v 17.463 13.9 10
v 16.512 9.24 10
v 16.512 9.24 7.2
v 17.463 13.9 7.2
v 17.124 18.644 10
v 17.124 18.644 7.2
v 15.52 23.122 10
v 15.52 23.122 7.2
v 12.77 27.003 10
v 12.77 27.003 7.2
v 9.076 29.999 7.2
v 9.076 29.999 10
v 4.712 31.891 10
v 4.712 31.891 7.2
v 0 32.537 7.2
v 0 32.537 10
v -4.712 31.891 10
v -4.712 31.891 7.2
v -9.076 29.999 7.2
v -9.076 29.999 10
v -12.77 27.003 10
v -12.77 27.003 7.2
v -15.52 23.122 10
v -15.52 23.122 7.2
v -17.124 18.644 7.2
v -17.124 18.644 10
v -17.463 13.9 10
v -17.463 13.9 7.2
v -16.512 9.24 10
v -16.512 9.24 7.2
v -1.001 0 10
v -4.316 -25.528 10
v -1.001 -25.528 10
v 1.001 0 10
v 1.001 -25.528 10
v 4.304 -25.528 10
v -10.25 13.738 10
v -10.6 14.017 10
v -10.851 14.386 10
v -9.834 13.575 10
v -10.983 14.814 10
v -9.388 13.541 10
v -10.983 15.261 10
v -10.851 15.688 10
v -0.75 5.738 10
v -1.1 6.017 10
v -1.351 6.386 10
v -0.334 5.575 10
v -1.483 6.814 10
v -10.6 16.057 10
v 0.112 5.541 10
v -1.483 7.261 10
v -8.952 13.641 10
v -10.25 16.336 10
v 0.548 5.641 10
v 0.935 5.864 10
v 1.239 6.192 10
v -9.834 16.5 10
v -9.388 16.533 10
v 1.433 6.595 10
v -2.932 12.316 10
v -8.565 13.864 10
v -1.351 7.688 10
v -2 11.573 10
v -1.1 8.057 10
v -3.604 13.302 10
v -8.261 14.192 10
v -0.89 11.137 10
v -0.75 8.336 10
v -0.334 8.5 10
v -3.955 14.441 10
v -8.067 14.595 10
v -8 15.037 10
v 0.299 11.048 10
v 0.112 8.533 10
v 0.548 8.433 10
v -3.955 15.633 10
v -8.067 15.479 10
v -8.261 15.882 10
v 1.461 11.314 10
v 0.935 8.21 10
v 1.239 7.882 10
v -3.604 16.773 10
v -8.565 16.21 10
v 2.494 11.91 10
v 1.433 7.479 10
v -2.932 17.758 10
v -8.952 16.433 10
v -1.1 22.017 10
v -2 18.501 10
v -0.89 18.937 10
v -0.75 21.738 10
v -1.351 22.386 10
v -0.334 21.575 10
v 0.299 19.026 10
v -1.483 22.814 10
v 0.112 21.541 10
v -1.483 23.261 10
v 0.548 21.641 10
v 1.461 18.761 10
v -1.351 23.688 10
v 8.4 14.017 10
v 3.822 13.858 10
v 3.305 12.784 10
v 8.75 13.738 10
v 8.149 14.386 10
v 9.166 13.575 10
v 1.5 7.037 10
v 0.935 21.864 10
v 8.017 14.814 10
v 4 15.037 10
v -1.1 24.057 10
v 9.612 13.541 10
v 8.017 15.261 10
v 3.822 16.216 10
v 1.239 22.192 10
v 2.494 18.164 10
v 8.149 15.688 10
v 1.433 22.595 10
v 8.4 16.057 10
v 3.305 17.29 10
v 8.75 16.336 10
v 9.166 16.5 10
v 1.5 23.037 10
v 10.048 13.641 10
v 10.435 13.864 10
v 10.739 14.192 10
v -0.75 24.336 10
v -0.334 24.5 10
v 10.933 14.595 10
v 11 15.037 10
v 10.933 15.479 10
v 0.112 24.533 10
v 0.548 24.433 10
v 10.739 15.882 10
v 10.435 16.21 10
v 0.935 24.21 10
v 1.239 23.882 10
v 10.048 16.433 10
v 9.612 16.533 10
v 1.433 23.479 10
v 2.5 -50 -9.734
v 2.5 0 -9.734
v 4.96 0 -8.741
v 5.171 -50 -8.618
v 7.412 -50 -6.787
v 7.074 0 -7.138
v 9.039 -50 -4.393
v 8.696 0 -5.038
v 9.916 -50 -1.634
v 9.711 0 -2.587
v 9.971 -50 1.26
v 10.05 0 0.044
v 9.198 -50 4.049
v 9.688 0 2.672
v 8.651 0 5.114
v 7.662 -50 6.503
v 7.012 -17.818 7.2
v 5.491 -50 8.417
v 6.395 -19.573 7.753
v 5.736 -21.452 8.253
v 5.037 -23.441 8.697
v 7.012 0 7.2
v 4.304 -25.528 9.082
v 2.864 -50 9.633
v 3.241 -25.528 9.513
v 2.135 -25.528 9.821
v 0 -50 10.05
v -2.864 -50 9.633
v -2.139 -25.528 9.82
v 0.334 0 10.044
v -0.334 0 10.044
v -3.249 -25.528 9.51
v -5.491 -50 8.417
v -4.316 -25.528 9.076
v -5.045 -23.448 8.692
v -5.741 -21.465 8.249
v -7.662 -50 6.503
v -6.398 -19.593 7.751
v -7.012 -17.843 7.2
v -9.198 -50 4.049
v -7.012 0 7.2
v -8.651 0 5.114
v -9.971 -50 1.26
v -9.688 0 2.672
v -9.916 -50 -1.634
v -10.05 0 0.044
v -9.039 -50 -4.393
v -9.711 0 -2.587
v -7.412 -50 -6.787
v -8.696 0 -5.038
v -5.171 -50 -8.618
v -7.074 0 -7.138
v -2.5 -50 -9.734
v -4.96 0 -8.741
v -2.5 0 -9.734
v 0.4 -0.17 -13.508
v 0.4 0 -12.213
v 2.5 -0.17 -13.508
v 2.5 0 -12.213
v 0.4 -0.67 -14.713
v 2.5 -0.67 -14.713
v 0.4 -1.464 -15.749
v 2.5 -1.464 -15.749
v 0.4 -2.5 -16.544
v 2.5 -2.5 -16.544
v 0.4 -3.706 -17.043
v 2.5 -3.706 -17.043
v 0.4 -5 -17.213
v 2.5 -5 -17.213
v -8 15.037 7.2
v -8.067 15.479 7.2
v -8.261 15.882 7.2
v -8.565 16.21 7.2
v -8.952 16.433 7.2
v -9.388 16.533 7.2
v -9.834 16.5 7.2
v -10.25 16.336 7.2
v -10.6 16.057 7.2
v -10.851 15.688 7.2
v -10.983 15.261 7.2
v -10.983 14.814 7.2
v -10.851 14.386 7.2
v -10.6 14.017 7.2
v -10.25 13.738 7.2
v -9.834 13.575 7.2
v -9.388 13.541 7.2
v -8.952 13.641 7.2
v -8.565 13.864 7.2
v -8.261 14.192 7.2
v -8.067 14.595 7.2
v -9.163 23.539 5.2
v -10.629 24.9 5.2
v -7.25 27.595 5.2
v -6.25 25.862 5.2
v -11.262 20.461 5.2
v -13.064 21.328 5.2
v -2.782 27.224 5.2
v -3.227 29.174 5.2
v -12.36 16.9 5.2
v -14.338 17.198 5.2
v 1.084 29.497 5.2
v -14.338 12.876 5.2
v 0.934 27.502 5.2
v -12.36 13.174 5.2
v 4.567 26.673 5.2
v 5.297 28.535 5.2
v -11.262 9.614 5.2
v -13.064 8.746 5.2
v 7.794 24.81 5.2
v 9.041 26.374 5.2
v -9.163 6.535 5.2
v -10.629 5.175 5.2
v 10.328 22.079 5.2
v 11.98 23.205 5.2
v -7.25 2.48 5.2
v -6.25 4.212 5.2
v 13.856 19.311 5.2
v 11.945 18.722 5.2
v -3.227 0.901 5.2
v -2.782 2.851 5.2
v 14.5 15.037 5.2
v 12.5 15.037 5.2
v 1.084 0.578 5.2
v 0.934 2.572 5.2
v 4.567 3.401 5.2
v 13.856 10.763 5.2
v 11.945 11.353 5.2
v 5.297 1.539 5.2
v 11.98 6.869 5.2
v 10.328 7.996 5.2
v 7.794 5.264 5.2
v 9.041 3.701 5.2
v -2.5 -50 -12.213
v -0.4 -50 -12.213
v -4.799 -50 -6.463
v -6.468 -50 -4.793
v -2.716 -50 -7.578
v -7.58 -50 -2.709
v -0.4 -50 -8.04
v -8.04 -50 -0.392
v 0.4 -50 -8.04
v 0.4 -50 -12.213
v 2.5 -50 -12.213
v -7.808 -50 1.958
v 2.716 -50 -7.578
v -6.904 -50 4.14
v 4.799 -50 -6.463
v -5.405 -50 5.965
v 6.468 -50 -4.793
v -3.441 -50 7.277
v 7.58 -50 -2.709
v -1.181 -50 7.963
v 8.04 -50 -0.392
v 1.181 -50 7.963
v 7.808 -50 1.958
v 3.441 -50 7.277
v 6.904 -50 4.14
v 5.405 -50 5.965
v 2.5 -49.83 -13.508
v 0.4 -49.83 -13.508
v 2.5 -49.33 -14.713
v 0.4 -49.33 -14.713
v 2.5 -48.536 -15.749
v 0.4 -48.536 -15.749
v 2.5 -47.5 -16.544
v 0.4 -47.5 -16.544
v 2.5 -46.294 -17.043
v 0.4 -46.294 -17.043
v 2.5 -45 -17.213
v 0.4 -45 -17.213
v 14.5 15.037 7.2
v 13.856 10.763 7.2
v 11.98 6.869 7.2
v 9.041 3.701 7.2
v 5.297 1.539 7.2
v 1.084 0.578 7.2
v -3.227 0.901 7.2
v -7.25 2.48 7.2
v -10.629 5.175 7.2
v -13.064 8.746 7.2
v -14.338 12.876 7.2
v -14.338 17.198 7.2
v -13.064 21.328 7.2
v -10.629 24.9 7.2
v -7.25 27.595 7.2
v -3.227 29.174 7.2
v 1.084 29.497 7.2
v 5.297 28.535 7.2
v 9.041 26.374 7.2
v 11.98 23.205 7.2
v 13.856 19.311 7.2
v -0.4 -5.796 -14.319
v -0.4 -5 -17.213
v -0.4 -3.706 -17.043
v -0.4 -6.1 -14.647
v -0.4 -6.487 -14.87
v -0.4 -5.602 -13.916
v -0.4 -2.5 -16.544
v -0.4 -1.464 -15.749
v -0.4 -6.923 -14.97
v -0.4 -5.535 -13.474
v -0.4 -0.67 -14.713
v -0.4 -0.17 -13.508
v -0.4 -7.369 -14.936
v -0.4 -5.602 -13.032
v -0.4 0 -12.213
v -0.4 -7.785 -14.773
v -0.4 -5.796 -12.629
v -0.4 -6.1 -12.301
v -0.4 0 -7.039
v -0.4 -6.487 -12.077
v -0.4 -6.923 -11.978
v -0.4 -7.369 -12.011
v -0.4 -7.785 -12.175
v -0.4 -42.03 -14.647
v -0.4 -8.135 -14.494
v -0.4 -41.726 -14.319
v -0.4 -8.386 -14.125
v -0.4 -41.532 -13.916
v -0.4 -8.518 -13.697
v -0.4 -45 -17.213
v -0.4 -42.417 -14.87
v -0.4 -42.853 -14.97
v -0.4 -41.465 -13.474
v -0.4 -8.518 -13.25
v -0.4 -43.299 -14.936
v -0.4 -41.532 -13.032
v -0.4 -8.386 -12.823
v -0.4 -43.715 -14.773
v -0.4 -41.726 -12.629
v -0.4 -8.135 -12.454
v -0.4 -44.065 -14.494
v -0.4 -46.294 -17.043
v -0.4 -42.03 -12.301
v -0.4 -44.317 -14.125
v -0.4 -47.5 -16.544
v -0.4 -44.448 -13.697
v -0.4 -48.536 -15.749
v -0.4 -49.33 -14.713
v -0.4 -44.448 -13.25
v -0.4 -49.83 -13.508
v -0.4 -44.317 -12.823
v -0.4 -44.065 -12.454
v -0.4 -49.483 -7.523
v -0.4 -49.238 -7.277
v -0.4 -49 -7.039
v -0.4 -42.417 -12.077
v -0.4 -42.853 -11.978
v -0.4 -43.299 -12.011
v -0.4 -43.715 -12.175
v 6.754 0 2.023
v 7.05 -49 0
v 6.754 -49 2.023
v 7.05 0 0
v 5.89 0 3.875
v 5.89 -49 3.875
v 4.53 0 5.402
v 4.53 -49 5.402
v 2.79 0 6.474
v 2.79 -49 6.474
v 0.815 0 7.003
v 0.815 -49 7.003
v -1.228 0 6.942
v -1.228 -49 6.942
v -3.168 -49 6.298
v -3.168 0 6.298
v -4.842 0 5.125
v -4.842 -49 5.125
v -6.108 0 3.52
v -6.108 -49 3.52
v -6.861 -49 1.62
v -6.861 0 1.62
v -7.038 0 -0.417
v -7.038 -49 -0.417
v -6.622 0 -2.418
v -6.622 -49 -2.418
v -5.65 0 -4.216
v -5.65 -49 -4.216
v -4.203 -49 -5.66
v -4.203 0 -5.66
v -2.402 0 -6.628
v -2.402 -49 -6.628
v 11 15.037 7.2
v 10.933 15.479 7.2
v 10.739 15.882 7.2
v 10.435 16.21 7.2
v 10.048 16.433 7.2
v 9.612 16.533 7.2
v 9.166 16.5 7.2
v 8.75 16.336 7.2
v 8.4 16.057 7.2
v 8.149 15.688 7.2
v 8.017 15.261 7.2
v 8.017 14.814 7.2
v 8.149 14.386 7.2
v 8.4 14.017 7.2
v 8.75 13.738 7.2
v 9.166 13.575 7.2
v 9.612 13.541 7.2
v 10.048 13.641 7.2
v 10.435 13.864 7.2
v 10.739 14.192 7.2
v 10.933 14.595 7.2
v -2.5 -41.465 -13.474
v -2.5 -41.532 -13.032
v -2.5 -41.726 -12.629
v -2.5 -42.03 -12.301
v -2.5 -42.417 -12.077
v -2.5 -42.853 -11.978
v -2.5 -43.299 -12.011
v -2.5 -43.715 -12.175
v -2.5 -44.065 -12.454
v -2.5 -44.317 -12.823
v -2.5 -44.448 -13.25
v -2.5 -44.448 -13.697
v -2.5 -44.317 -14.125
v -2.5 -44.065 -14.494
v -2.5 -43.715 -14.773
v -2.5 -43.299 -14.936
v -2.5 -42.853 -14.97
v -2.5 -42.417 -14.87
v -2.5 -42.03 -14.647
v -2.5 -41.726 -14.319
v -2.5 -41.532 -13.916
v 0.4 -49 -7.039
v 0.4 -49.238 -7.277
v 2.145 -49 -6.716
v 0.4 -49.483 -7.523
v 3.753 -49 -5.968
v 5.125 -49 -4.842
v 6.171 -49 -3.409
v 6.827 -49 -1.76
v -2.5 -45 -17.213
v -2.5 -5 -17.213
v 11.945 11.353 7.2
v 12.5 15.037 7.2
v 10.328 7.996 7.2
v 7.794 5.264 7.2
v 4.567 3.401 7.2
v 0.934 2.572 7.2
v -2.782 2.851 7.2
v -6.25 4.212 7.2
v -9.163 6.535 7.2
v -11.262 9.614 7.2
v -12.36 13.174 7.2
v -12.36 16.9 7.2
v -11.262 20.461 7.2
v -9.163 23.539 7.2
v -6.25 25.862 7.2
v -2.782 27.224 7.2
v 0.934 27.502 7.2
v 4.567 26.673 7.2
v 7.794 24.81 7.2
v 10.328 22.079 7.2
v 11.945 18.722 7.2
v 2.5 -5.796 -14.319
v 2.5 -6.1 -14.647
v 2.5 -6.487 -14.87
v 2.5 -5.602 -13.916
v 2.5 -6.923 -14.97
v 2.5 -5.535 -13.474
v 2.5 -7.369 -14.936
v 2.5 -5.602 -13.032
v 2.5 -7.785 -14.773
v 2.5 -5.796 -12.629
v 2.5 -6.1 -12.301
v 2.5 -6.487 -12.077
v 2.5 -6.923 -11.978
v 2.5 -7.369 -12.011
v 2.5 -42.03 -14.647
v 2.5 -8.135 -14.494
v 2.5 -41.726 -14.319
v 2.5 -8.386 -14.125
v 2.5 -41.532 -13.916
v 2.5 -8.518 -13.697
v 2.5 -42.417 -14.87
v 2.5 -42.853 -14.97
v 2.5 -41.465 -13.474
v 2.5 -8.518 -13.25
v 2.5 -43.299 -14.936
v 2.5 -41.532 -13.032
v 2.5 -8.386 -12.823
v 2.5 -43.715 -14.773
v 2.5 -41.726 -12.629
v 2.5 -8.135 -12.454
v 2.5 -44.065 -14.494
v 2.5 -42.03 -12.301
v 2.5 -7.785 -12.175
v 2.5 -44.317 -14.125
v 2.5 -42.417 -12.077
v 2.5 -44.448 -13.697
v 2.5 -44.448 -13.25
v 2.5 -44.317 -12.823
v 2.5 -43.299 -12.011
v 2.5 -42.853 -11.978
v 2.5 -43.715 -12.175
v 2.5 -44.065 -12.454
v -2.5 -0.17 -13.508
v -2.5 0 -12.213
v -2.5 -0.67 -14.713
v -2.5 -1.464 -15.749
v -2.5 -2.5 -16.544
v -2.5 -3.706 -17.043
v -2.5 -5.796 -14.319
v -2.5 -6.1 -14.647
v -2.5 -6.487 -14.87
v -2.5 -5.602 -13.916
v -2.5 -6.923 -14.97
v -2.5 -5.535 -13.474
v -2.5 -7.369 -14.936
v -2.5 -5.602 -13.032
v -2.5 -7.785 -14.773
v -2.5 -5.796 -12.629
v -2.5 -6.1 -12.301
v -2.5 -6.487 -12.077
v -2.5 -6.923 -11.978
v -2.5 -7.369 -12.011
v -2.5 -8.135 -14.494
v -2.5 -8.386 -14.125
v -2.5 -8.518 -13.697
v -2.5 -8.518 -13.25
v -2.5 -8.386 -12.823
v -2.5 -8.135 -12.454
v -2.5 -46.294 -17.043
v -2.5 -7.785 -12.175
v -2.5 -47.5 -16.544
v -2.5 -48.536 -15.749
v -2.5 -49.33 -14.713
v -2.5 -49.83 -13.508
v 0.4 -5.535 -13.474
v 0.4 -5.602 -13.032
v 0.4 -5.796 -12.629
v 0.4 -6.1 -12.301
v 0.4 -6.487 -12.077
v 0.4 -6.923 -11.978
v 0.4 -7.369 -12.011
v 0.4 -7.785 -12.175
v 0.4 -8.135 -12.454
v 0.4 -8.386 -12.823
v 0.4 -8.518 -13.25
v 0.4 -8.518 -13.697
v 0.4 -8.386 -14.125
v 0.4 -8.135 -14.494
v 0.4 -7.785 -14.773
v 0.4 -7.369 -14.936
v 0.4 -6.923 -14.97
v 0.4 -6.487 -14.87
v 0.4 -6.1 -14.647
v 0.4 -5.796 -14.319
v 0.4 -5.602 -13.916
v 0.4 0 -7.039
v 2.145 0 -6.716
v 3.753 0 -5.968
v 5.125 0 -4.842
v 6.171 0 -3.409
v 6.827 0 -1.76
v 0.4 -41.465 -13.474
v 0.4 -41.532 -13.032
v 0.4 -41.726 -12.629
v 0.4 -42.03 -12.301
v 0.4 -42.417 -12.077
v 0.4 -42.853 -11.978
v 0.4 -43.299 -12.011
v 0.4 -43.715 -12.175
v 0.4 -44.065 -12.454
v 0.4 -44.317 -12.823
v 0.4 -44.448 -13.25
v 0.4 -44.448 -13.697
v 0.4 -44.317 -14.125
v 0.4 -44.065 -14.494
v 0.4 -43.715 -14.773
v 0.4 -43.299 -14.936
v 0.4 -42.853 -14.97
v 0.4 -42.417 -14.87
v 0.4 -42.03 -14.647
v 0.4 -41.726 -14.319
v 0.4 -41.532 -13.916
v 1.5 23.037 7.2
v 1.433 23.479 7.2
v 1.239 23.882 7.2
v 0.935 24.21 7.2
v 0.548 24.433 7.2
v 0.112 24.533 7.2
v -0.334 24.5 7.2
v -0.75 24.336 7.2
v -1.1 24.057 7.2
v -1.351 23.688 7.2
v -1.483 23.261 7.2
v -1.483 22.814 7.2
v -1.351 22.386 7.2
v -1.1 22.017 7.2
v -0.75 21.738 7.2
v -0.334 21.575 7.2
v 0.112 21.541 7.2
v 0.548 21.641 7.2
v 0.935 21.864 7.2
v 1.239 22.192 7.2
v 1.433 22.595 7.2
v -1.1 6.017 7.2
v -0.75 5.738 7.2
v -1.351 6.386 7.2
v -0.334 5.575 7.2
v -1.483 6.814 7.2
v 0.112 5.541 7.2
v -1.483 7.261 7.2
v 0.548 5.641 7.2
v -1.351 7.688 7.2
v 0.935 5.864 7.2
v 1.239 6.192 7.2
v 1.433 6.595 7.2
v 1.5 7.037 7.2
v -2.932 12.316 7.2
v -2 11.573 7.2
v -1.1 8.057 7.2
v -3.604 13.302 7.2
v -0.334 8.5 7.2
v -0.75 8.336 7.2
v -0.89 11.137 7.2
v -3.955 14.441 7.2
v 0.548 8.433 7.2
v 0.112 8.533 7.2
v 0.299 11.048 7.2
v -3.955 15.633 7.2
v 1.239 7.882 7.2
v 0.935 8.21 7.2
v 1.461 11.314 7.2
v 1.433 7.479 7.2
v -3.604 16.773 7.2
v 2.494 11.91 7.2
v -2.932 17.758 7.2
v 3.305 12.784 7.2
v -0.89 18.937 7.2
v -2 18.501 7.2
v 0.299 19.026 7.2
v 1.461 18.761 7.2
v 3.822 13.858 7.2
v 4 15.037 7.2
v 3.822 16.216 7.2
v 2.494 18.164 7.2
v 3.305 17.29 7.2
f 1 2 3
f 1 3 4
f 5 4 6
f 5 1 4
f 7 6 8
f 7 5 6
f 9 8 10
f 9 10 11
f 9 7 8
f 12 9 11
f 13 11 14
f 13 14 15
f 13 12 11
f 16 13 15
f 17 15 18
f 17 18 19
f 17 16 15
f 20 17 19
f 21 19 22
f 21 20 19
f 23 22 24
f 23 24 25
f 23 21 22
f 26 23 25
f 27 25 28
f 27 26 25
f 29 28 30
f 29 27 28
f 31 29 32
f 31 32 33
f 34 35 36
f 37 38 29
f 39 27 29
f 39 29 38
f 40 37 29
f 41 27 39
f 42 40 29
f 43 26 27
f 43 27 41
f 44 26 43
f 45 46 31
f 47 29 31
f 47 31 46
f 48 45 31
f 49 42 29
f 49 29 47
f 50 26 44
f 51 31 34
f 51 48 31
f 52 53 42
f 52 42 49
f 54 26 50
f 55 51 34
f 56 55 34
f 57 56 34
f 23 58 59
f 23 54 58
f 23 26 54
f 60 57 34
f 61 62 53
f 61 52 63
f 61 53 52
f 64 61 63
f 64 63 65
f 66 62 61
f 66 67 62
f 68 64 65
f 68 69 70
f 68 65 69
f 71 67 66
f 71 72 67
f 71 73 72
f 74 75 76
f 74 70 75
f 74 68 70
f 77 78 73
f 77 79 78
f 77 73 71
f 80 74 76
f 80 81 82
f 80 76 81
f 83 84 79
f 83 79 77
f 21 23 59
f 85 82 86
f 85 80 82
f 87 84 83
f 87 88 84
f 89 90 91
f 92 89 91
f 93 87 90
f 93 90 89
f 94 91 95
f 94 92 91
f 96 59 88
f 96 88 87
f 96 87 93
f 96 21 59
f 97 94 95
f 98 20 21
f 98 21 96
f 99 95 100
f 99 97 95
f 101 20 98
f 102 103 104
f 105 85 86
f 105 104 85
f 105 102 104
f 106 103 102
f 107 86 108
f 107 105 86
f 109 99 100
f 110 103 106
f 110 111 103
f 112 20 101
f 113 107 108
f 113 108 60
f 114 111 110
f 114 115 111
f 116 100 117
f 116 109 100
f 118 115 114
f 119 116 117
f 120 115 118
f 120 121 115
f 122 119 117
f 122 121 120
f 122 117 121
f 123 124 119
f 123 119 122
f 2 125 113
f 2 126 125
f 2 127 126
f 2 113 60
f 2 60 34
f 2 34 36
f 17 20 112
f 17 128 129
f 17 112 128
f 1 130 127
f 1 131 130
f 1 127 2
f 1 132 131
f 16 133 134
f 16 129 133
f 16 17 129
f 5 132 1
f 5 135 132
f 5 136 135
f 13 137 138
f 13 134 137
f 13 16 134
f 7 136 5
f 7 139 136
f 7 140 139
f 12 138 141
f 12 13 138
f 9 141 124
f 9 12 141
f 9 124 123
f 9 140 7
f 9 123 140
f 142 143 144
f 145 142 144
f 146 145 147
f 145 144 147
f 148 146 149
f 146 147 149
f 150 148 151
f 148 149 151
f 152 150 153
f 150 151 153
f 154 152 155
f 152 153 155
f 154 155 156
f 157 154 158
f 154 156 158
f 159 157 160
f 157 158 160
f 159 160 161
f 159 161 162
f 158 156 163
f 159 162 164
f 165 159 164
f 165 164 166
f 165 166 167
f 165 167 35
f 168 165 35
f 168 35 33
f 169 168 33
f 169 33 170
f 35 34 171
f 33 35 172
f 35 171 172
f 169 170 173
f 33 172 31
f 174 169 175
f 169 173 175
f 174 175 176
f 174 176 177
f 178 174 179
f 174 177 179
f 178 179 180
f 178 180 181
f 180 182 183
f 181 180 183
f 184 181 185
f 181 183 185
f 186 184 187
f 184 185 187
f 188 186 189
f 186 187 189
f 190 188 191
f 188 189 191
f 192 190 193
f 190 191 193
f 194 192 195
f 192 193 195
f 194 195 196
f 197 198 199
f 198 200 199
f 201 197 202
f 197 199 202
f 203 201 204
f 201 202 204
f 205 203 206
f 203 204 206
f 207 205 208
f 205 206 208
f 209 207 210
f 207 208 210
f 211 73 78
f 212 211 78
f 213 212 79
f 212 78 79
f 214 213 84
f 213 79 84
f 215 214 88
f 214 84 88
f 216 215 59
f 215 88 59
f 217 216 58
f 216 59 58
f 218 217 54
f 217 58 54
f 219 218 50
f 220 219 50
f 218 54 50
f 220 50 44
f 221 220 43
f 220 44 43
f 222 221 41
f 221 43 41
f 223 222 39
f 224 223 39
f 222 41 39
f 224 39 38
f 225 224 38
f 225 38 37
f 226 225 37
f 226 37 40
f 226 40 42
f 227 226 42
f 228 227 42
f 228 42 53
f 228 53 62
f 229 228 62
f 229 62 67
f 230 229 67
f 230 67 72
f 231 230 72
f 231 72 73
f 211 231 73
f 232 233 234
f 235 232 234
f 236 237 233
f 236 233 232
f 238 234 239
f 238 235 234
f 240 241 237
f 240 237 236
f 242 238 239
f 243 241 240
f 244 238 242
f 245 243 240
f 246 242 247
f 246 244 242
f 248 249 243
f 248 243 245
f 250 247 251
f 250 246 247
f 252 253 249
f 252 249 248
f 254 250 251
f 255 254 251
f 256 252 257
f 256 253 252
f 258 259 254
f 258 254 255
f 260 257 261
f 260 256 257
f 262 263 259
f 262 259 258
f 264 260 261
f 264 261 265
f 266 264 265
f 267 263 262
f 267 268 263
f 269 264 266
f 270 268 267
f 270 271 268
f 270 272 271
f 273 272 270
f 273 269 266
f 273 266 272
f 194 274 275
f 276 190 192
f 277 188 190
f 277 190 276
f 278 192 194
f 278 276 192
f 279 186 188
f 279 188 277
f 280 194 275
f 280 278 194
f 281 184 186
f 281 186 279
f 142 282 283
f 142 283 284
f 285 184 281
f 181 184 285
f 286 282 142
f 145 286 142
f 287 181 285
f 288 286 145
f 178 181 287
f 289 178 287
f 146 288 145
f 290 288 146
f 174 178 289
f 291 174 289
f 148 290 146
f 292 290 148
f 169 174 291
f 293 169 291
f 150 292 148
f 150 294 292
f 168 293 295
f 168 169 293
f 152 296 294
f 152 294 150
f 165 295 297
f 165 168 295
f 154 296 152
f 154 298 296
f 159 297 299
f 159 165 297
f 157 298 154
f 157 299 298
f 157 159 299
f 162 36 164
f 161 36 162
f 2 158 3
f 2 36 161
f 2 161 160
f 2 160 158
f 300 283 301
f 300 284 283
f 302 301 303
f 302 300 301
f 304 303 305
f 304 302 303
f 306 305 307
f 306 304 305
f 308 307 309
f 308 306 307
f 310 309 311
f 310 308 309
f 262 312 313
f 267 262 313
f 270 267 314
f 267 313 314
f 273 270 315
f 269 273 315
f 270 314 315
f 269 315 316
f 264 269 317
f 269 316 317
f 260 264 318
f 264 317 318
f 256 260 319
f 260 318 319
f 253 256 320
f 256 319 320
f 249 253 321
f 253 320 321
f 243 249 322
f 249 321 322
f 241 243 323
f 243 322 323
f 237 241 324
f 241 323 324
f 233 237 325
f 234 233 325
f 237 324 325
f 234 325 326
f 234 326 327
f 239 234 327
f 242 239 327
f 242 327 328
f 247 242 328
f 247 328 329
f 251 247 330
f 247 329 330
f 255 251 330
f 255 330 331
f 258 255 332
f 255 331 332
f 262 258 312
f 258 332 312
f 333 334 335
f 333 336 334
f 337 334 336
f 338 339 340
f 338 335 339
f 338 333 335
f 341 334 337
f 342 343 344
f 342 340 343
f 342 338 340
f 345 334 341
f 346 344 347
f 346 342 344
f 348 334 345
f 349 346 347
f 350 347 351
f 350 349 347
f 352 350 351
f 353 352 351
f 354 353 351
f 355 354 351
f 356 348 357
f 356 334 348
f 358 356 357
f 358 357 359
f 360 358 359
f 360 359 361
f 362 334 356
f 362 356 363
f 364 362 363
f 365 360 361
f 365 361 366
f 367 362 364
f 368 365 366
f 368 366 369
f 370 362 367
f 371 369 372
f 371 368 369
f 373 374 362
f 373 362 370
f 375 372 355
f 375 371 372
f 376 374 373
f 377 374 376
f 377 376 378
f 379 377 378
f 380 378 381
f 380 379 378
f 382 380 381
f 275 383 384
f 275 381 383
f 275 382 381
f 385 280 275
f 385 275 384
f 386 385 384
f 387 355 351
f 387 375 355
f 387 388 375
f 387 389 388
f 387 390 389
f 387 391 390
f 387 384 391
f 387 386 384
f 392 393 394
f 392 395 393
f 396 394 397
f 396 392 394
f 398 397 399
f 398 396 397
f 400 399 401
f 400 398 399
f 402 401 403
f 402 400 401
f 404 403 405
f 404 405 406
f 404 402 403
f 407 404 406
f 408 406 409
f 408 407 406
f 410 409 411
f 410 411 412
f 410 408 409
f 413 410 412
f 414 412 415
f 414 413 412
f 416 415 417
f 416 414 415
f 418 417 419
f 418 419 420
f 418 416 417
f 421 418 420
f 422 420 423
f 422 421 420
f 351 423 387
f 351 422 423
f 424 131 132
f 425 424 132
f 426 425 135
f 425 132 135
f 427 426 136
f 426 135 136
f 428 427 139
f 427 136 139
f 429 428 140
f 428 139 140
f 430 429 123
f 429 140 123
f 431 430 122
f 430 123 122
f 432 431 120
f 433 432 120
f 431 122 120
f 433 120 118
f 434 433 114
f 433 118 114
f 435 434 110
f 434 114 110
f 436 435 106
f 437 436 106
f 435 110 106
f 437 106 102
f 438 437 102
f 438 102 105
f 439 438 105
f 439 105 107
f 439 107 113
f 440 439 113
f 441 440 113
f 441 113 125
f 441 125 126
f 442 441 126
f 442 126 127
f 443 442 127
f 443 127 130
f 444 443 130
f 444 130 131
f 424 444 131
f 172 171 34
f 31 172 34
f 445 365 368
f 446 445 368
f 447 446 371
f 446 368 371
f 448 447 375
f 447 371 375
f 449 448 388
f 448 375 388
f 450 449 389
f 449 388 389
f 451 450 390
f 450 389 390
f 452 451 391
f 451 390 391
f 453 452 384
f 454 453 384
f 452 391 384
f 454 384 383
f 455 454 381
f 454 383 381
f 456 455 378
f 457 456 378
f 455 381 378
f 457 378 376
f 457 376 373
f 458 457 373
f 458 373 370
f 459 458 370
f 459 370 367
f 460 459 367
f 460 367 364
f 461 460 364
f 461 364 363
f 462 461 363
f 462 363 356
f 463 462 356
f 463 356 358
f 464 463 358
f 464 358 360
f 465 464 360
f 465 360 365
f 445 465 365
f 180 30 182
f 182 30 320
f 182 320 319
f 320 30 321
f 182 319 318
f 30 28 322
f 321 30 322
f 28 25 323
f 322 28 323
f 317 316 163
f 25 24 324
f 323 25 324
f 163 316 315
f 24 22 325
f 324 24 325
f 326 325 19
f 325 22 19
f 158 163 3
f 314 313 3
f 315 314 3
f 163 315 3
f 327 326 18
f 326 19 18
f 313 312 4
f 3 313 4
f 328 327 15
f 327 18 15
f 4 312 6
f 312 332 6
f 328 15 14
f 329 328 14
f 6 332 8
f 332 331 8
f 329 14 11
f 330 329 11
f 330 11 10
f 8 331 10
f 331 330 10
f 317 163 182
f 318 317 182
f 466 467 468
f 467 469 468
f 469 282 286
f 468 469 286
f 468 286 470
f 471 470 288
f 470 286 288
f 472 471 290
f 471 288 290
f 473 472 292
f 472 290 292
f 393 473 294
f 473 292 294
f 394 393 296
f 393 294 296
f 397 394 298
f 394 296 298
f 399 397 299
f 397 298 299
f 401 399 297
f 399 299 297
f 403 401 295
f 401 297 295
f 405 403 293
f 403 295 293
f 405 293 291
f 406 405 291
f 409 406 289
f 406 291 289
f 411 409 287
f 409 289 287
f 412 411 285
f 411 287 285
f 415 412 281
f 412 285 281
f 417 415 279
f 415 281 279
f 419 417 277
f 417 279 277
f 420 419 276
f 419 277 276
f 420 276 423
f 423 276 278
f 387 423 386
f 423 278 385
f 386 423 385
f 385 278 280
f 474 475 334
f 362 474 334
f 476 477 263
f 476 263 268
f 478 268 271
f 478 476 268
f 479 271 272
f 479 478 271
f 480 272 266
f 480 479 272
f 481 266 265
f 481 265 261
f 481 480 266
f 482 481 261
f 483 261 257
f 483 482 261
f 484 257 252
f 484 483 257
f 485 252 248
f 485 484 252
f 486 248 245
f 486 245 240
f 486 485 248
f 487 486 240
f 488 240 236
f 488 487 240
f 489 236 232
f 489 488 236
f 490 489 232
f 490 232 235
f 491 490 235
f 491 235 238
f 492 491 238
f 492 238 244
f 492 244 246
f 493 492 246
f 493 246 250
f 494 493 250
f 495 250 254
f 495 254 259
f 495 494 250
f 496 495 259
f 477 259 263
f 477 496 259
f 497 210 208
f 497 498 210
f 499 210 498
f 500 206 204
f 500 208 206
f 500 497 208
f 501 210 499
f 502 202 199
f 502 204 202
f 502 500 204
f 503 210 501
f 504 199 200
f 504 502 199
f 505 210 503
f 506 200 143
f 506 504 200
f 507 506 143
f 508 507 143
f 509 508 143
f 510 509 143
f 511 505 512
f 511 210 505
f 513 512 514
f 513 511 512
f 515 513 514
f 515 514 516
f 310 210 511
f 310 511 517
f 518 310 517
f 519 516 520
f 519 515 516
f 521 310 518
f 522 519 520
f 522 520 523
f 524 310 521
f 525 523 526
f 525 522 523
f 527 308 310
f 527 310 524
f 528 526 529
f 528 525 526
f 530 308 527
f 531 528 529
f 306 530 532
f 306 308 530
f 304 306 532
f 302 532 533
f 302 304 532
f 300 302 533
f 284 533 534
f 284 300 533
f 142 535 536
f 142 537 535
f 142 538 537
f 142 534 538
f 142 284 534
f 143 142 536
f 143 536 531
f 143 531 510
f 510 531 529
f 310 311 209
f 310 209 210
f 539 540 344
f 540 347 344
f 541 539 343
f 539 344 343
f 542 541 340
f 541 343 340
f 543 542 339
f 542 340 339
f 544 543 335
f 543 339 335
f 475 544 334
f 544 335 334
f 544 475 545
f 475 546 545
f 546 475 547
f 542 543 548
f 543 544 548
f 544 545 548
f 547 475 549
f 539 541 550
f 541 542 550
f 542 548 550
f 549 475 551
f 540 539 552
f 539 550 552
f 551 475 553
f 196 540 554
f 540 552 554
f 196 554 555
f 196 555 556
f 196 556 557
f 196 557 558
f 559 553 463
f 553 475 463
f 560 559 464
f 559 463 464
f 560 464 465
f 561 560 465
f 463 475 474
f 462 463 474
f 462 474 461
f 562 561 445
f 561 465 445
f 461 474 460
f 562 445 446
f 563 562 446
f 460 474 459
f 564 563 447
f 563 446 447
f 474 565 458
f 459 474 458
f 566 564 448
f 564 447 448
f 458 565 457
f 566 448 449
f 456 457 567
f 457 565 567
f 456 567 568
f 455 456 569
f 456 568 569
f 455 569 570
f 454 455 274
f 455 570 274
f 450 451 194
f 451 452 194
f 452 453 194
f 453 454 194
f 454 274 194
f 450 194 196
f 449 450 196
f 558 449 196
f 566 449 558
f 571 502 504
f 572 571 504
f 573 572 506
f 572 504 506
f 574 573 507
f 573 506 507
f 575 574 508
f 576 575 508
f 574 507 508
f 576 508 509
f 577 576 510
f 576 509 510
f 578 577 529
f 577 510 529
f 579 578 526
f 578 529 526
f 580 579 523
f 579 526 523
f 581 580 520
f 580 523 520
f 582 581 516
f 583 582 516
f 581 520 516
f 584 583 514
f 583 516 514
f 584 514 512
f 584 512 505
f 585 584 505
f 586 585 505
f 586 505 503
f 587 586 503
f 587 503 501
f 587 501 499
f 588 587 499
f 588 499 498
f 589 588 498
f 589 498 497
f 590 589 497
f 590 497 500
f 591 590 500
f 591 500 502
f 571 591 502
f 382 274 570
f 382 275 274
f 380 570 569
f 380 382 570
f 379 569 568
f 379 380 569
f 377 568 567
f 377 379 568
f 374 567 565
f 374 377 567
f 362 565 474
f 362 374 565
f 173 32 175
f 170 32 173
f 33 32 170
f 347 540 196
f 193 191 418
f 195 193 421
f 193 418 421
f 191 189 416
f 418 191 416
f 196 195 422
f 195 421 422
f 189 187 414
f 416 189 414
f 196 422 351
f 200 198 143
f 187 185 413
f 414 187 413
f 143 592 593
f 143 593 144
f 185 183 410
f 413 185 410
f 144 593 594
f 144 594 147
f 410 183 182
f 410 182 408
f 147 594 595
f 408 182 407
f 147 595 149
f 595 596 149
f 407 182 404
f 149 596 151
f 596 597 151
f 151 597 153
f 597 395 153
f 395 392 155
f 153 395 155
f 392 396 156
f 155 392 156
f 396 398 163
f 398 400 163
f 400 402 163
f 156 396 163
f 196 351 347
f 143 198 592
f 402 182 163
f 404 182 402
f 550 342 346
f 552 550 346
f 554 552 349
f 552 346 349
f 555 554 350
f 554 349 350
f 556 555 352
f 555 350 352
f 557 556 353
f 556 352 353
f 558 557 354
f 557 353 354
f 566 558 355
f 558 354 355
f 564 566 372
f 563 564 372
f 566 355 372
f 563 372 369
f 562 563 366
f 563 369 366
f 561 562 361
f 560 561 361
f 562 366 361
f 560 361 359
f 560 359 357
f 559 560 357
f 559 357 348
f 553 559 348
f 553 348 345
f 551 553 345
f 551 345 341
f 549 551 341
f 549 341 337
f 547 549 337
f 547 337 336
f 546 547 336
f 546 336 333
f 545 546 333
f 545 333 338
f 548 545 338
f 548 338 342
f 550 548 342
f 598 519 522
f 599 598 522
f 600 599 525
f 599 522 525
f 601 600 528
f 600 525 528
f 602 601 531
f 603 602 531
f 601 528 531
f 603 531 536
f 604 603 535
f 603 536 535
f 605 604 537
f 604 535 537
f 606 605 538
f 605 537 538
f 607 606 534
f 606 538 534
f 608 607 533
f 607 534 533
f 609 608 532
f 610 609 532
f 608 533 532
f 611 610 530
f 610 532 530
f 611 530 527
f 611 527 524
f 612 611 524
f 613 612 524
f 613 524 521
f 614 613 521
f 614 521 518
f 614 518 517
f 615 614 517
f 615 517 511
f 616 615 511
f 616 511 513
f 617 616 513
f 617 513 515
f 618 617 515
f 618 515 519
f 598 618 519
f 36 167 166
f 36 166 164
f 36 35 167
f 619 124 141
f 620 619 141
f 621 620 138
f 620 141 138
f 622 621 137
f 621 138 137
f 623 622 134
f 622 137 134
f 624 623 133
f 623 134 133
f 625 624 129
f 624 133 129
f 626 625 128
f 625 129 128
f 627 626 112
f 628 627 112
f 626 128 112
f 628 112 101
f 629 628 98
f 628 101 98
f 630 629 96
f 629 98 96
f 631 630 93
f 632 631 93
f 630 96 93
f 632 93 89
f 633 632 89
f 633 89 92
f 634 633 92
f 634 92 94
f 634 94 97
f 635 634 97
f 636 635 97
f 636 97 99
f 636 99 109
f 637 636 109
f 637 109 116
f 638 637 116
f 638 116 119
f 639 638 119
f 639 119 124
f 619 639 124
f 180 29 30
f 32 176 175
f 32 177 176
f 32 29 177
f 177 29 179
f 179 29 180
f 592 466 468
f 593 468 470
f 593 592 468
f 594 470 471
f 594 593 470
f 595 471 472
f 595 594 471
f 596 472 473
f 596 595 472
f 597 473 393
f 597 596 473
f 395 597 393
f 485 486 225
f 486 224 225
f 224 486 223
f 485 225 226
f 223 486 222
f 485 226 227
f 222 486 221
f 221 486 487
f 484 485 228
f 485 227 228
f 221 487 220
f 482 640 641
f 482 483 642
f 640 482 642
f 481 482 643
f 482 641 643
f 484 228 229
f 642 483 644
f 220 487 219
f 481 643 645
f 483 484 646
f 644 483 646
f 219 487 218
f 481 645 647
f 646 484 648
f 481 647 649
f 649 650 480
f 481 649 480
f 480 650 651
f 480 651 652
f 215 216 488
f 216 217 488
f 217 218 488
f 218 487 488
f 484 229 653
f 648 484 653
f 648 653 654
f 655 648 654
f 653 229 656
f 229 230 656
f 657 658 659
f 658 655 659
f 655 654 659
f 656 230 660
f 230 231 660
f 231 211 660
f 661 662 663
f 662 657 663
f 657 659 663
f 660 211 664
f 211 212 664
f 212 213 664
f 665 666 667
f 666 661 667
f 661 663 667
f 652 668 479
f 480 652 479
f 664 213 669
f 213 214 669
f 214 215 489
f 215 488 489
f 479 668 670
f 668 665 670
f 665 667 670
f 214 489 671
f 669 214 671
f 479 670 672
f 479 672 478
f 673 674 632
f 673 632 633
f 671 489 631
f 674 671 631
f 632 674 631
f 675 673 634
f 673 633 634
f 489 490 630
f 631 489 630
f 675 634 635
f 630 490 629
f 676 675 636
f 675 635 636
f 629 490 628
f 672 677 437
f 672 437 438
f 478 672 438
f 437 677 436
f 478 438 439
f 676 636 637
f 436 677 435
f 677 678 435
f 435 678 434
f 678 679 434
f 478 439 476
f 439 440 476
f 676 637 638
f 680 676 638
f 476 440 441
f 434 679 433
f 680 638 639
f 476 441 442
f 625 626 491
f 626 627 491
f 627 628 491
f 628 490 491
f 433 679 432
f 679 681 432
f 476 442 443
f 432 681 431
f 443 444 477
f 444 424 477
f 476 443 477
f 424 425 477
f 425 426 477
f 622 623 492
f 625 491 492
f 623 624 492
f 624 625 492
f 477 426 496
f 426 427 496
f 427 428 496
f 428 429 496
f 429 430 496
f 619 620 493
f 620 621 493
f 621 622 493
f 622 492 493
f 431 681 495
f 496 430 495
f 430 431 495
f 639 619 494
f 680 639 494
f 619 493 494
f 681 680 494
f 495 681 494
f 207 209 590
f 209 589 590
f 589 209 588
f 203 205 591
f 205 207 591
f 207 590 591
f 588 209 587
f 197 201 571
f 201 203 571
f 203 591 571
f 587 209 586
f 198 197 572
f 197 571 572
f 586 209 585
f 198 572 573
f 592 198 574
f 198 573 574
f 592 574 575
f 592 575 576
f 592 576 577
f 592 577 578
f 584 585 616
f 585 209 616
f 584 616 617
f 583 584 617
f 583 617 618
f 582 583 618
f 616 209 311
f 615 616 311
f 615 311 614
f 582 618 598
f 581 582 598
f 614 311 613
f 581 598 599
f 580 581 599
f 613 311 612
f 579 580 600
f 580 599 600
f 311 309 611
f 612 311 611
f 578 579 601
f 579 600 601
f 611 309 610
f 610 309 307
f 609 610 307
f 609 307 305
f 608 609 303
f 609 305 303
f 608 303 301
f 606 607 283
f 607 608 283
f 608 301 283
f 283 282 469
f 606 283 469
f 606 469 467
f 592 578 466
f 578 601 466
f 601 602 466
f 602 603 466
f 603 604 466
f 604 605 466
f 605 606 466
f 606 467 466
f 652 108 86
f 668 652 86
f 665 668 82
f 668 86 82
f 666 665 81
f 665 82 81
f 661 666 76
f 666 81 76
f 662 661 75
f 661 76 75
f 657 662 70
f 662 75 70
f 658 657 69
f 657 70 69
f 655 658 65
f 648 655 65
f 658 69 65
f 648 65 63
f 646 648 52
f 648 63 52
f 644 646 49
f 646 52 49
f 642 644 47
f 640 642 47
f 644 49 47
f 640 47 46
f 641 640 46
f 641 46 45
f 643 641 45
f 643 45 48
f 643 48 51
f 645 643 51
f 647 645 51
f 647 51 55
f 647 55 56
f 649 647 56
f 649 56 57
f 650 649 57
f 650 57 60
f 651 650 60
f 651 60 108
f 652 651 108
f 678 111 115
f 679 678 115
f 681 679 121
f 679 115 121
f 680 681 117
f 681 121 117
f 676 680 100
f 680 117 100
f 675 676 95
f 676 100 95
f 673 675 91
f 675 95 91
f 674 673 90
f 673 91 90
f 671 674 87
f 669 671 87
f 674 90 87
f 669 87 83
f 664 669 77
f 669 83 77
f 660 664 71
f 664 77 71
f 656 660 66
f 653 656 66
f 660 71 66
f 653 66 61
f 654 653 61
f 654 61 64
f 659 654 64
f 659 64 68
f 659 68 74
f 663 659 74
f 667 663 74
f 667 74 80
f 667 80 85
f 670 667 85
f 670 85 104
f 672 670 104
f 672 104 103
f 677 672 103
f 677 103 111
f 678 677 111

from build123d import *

# Parameters (mm, degrees)
F0_R      = 10.05
F0_R_2    = 7.05
F1_DEPTH  = 50
F3_R      = 17.5
F4_DEPTH  = 2.8
F5_W      = 5
F5_H      = 10
F6_DEPTH  = 50
F7_W      = 0.8
F7_H      = 12.637284
F8_DEPTH  = 82.538162
F10_DEPTH = 2.8
F11_R     = 1.5
F11_R_2   = 4
F12_DEPTH = 25
F13_R     = 14.5
F13_R_2   = 12.5
F14_DEPTH = 2
F15_R     = 1.5
F16_DEPTH = 20.001
F17_R     = 5
F18_SIZE  = 1


with BuildPart() as f1:
    # F0 (on Front) → F1 (new body)
    with BuildSketch(Plane.XZ):
        Circle(F0_R)
        Circle(F0_R_2, mode=Mode.SUBTRACT)
    extrude(amount=F1_DEPTH)

    # F3 (on offset) → F4 (join)
    with BuildSketch(Plane.XY.offset(10)):
        with Locations((0, 15.037162)):
            Circle(F3_R)
    extrude(amount=-F4_DEPTH)

    # F5 (on face) → F6 (join, through all)
    with BuildSketch(Plane.XZ.offset(50)):
        with Locations((0, -12.213485)):
            Rectangle(F5_W, F5_H)
    extrude(amount=-F6_DEPTH)

    # F7 (on face) → F8 (cut, through all)
    with BuildSketch(Plane.XZ.offset(50)):
        with Locations((0, -12.604385)):
            Rectangle(F7_W, F7_H)
    extrude(amount=-F8_DEPTH, mode=Mode.SUBTRACT)

    # F9 (on face) → F10 (join)
    with BuildSketch(Plane.XY.offset(10)):
        Polygon((4.304297, -25.528217), (16.511778, 9.239647), (-16.511778, 9.239647), (-4.315564, -25.528217), align=None)
    extrude(amount=-F10_DEPTH)

    # F11 (on face) → F12 (cut)
    with BuildSketch(Plane.XY.offset(10)):
        with Locations((0, 23.037162)):
            Circle(F11_R)
        with Locations((-9.5, 15.037162)):
            Circle(F11_R)
        with Locations((0, 7.037162)):
            Circle(F11_R)
        with Locations((9.5, 15.037162)):
            Circle(F11_R)
        with Locations((0, 15.037162)):
            Circle(F11_R_2)
    extrude(amount=-F12_DEPTH, mode=Mode.SUBTRACT)

    # F13 (on face) → F14 (join)
    with BuildSketch(Plane(origin=(0, 0, 7.2), x_dir=(1, 0, 0), z_dir=(0, 0, -1))):
        with Locations((0, -15.037162)):
            Circle(F13_R)
        with Locations((0, -15.037162)):
            Circle(F13_R_2, mode=Mode.SUBTRACT)
    extrude(amount=F14_DEPTH)

    # F15 (on face) → F16 (cut, through all)
    with BuildSketch(Plane.YZ.offset(2.5)):
        with Locations((-7.034952, -13.473787)):
            Circle(F15_R)
        with Locations((-42.965048, -13.473787)):
            Circle(F15_R)
    extrude(amount=-F16_DEPTH, mode=Mode.SUBTRACT)

    # F17
    f17_edges = [f1.edges().sort_by_distance(p)[0] for p in [
        (1.45, -50, -17.213485),
        (-1.45, -50, -17.213485),
        (1.45, 0, -17.213485),
        (-1.45, 0, -17.213485),
    ]]
    fillet(f17_edges, radius=F17_R)

    # F18
    f18_edges = [f1.edges().sort_by_distance(p)[0] for p in [
        (-4.841616, -50, 5.124573),
    ]]
    chamfer(f18_edges, length=F18_SIZE)


solid = f1.part
